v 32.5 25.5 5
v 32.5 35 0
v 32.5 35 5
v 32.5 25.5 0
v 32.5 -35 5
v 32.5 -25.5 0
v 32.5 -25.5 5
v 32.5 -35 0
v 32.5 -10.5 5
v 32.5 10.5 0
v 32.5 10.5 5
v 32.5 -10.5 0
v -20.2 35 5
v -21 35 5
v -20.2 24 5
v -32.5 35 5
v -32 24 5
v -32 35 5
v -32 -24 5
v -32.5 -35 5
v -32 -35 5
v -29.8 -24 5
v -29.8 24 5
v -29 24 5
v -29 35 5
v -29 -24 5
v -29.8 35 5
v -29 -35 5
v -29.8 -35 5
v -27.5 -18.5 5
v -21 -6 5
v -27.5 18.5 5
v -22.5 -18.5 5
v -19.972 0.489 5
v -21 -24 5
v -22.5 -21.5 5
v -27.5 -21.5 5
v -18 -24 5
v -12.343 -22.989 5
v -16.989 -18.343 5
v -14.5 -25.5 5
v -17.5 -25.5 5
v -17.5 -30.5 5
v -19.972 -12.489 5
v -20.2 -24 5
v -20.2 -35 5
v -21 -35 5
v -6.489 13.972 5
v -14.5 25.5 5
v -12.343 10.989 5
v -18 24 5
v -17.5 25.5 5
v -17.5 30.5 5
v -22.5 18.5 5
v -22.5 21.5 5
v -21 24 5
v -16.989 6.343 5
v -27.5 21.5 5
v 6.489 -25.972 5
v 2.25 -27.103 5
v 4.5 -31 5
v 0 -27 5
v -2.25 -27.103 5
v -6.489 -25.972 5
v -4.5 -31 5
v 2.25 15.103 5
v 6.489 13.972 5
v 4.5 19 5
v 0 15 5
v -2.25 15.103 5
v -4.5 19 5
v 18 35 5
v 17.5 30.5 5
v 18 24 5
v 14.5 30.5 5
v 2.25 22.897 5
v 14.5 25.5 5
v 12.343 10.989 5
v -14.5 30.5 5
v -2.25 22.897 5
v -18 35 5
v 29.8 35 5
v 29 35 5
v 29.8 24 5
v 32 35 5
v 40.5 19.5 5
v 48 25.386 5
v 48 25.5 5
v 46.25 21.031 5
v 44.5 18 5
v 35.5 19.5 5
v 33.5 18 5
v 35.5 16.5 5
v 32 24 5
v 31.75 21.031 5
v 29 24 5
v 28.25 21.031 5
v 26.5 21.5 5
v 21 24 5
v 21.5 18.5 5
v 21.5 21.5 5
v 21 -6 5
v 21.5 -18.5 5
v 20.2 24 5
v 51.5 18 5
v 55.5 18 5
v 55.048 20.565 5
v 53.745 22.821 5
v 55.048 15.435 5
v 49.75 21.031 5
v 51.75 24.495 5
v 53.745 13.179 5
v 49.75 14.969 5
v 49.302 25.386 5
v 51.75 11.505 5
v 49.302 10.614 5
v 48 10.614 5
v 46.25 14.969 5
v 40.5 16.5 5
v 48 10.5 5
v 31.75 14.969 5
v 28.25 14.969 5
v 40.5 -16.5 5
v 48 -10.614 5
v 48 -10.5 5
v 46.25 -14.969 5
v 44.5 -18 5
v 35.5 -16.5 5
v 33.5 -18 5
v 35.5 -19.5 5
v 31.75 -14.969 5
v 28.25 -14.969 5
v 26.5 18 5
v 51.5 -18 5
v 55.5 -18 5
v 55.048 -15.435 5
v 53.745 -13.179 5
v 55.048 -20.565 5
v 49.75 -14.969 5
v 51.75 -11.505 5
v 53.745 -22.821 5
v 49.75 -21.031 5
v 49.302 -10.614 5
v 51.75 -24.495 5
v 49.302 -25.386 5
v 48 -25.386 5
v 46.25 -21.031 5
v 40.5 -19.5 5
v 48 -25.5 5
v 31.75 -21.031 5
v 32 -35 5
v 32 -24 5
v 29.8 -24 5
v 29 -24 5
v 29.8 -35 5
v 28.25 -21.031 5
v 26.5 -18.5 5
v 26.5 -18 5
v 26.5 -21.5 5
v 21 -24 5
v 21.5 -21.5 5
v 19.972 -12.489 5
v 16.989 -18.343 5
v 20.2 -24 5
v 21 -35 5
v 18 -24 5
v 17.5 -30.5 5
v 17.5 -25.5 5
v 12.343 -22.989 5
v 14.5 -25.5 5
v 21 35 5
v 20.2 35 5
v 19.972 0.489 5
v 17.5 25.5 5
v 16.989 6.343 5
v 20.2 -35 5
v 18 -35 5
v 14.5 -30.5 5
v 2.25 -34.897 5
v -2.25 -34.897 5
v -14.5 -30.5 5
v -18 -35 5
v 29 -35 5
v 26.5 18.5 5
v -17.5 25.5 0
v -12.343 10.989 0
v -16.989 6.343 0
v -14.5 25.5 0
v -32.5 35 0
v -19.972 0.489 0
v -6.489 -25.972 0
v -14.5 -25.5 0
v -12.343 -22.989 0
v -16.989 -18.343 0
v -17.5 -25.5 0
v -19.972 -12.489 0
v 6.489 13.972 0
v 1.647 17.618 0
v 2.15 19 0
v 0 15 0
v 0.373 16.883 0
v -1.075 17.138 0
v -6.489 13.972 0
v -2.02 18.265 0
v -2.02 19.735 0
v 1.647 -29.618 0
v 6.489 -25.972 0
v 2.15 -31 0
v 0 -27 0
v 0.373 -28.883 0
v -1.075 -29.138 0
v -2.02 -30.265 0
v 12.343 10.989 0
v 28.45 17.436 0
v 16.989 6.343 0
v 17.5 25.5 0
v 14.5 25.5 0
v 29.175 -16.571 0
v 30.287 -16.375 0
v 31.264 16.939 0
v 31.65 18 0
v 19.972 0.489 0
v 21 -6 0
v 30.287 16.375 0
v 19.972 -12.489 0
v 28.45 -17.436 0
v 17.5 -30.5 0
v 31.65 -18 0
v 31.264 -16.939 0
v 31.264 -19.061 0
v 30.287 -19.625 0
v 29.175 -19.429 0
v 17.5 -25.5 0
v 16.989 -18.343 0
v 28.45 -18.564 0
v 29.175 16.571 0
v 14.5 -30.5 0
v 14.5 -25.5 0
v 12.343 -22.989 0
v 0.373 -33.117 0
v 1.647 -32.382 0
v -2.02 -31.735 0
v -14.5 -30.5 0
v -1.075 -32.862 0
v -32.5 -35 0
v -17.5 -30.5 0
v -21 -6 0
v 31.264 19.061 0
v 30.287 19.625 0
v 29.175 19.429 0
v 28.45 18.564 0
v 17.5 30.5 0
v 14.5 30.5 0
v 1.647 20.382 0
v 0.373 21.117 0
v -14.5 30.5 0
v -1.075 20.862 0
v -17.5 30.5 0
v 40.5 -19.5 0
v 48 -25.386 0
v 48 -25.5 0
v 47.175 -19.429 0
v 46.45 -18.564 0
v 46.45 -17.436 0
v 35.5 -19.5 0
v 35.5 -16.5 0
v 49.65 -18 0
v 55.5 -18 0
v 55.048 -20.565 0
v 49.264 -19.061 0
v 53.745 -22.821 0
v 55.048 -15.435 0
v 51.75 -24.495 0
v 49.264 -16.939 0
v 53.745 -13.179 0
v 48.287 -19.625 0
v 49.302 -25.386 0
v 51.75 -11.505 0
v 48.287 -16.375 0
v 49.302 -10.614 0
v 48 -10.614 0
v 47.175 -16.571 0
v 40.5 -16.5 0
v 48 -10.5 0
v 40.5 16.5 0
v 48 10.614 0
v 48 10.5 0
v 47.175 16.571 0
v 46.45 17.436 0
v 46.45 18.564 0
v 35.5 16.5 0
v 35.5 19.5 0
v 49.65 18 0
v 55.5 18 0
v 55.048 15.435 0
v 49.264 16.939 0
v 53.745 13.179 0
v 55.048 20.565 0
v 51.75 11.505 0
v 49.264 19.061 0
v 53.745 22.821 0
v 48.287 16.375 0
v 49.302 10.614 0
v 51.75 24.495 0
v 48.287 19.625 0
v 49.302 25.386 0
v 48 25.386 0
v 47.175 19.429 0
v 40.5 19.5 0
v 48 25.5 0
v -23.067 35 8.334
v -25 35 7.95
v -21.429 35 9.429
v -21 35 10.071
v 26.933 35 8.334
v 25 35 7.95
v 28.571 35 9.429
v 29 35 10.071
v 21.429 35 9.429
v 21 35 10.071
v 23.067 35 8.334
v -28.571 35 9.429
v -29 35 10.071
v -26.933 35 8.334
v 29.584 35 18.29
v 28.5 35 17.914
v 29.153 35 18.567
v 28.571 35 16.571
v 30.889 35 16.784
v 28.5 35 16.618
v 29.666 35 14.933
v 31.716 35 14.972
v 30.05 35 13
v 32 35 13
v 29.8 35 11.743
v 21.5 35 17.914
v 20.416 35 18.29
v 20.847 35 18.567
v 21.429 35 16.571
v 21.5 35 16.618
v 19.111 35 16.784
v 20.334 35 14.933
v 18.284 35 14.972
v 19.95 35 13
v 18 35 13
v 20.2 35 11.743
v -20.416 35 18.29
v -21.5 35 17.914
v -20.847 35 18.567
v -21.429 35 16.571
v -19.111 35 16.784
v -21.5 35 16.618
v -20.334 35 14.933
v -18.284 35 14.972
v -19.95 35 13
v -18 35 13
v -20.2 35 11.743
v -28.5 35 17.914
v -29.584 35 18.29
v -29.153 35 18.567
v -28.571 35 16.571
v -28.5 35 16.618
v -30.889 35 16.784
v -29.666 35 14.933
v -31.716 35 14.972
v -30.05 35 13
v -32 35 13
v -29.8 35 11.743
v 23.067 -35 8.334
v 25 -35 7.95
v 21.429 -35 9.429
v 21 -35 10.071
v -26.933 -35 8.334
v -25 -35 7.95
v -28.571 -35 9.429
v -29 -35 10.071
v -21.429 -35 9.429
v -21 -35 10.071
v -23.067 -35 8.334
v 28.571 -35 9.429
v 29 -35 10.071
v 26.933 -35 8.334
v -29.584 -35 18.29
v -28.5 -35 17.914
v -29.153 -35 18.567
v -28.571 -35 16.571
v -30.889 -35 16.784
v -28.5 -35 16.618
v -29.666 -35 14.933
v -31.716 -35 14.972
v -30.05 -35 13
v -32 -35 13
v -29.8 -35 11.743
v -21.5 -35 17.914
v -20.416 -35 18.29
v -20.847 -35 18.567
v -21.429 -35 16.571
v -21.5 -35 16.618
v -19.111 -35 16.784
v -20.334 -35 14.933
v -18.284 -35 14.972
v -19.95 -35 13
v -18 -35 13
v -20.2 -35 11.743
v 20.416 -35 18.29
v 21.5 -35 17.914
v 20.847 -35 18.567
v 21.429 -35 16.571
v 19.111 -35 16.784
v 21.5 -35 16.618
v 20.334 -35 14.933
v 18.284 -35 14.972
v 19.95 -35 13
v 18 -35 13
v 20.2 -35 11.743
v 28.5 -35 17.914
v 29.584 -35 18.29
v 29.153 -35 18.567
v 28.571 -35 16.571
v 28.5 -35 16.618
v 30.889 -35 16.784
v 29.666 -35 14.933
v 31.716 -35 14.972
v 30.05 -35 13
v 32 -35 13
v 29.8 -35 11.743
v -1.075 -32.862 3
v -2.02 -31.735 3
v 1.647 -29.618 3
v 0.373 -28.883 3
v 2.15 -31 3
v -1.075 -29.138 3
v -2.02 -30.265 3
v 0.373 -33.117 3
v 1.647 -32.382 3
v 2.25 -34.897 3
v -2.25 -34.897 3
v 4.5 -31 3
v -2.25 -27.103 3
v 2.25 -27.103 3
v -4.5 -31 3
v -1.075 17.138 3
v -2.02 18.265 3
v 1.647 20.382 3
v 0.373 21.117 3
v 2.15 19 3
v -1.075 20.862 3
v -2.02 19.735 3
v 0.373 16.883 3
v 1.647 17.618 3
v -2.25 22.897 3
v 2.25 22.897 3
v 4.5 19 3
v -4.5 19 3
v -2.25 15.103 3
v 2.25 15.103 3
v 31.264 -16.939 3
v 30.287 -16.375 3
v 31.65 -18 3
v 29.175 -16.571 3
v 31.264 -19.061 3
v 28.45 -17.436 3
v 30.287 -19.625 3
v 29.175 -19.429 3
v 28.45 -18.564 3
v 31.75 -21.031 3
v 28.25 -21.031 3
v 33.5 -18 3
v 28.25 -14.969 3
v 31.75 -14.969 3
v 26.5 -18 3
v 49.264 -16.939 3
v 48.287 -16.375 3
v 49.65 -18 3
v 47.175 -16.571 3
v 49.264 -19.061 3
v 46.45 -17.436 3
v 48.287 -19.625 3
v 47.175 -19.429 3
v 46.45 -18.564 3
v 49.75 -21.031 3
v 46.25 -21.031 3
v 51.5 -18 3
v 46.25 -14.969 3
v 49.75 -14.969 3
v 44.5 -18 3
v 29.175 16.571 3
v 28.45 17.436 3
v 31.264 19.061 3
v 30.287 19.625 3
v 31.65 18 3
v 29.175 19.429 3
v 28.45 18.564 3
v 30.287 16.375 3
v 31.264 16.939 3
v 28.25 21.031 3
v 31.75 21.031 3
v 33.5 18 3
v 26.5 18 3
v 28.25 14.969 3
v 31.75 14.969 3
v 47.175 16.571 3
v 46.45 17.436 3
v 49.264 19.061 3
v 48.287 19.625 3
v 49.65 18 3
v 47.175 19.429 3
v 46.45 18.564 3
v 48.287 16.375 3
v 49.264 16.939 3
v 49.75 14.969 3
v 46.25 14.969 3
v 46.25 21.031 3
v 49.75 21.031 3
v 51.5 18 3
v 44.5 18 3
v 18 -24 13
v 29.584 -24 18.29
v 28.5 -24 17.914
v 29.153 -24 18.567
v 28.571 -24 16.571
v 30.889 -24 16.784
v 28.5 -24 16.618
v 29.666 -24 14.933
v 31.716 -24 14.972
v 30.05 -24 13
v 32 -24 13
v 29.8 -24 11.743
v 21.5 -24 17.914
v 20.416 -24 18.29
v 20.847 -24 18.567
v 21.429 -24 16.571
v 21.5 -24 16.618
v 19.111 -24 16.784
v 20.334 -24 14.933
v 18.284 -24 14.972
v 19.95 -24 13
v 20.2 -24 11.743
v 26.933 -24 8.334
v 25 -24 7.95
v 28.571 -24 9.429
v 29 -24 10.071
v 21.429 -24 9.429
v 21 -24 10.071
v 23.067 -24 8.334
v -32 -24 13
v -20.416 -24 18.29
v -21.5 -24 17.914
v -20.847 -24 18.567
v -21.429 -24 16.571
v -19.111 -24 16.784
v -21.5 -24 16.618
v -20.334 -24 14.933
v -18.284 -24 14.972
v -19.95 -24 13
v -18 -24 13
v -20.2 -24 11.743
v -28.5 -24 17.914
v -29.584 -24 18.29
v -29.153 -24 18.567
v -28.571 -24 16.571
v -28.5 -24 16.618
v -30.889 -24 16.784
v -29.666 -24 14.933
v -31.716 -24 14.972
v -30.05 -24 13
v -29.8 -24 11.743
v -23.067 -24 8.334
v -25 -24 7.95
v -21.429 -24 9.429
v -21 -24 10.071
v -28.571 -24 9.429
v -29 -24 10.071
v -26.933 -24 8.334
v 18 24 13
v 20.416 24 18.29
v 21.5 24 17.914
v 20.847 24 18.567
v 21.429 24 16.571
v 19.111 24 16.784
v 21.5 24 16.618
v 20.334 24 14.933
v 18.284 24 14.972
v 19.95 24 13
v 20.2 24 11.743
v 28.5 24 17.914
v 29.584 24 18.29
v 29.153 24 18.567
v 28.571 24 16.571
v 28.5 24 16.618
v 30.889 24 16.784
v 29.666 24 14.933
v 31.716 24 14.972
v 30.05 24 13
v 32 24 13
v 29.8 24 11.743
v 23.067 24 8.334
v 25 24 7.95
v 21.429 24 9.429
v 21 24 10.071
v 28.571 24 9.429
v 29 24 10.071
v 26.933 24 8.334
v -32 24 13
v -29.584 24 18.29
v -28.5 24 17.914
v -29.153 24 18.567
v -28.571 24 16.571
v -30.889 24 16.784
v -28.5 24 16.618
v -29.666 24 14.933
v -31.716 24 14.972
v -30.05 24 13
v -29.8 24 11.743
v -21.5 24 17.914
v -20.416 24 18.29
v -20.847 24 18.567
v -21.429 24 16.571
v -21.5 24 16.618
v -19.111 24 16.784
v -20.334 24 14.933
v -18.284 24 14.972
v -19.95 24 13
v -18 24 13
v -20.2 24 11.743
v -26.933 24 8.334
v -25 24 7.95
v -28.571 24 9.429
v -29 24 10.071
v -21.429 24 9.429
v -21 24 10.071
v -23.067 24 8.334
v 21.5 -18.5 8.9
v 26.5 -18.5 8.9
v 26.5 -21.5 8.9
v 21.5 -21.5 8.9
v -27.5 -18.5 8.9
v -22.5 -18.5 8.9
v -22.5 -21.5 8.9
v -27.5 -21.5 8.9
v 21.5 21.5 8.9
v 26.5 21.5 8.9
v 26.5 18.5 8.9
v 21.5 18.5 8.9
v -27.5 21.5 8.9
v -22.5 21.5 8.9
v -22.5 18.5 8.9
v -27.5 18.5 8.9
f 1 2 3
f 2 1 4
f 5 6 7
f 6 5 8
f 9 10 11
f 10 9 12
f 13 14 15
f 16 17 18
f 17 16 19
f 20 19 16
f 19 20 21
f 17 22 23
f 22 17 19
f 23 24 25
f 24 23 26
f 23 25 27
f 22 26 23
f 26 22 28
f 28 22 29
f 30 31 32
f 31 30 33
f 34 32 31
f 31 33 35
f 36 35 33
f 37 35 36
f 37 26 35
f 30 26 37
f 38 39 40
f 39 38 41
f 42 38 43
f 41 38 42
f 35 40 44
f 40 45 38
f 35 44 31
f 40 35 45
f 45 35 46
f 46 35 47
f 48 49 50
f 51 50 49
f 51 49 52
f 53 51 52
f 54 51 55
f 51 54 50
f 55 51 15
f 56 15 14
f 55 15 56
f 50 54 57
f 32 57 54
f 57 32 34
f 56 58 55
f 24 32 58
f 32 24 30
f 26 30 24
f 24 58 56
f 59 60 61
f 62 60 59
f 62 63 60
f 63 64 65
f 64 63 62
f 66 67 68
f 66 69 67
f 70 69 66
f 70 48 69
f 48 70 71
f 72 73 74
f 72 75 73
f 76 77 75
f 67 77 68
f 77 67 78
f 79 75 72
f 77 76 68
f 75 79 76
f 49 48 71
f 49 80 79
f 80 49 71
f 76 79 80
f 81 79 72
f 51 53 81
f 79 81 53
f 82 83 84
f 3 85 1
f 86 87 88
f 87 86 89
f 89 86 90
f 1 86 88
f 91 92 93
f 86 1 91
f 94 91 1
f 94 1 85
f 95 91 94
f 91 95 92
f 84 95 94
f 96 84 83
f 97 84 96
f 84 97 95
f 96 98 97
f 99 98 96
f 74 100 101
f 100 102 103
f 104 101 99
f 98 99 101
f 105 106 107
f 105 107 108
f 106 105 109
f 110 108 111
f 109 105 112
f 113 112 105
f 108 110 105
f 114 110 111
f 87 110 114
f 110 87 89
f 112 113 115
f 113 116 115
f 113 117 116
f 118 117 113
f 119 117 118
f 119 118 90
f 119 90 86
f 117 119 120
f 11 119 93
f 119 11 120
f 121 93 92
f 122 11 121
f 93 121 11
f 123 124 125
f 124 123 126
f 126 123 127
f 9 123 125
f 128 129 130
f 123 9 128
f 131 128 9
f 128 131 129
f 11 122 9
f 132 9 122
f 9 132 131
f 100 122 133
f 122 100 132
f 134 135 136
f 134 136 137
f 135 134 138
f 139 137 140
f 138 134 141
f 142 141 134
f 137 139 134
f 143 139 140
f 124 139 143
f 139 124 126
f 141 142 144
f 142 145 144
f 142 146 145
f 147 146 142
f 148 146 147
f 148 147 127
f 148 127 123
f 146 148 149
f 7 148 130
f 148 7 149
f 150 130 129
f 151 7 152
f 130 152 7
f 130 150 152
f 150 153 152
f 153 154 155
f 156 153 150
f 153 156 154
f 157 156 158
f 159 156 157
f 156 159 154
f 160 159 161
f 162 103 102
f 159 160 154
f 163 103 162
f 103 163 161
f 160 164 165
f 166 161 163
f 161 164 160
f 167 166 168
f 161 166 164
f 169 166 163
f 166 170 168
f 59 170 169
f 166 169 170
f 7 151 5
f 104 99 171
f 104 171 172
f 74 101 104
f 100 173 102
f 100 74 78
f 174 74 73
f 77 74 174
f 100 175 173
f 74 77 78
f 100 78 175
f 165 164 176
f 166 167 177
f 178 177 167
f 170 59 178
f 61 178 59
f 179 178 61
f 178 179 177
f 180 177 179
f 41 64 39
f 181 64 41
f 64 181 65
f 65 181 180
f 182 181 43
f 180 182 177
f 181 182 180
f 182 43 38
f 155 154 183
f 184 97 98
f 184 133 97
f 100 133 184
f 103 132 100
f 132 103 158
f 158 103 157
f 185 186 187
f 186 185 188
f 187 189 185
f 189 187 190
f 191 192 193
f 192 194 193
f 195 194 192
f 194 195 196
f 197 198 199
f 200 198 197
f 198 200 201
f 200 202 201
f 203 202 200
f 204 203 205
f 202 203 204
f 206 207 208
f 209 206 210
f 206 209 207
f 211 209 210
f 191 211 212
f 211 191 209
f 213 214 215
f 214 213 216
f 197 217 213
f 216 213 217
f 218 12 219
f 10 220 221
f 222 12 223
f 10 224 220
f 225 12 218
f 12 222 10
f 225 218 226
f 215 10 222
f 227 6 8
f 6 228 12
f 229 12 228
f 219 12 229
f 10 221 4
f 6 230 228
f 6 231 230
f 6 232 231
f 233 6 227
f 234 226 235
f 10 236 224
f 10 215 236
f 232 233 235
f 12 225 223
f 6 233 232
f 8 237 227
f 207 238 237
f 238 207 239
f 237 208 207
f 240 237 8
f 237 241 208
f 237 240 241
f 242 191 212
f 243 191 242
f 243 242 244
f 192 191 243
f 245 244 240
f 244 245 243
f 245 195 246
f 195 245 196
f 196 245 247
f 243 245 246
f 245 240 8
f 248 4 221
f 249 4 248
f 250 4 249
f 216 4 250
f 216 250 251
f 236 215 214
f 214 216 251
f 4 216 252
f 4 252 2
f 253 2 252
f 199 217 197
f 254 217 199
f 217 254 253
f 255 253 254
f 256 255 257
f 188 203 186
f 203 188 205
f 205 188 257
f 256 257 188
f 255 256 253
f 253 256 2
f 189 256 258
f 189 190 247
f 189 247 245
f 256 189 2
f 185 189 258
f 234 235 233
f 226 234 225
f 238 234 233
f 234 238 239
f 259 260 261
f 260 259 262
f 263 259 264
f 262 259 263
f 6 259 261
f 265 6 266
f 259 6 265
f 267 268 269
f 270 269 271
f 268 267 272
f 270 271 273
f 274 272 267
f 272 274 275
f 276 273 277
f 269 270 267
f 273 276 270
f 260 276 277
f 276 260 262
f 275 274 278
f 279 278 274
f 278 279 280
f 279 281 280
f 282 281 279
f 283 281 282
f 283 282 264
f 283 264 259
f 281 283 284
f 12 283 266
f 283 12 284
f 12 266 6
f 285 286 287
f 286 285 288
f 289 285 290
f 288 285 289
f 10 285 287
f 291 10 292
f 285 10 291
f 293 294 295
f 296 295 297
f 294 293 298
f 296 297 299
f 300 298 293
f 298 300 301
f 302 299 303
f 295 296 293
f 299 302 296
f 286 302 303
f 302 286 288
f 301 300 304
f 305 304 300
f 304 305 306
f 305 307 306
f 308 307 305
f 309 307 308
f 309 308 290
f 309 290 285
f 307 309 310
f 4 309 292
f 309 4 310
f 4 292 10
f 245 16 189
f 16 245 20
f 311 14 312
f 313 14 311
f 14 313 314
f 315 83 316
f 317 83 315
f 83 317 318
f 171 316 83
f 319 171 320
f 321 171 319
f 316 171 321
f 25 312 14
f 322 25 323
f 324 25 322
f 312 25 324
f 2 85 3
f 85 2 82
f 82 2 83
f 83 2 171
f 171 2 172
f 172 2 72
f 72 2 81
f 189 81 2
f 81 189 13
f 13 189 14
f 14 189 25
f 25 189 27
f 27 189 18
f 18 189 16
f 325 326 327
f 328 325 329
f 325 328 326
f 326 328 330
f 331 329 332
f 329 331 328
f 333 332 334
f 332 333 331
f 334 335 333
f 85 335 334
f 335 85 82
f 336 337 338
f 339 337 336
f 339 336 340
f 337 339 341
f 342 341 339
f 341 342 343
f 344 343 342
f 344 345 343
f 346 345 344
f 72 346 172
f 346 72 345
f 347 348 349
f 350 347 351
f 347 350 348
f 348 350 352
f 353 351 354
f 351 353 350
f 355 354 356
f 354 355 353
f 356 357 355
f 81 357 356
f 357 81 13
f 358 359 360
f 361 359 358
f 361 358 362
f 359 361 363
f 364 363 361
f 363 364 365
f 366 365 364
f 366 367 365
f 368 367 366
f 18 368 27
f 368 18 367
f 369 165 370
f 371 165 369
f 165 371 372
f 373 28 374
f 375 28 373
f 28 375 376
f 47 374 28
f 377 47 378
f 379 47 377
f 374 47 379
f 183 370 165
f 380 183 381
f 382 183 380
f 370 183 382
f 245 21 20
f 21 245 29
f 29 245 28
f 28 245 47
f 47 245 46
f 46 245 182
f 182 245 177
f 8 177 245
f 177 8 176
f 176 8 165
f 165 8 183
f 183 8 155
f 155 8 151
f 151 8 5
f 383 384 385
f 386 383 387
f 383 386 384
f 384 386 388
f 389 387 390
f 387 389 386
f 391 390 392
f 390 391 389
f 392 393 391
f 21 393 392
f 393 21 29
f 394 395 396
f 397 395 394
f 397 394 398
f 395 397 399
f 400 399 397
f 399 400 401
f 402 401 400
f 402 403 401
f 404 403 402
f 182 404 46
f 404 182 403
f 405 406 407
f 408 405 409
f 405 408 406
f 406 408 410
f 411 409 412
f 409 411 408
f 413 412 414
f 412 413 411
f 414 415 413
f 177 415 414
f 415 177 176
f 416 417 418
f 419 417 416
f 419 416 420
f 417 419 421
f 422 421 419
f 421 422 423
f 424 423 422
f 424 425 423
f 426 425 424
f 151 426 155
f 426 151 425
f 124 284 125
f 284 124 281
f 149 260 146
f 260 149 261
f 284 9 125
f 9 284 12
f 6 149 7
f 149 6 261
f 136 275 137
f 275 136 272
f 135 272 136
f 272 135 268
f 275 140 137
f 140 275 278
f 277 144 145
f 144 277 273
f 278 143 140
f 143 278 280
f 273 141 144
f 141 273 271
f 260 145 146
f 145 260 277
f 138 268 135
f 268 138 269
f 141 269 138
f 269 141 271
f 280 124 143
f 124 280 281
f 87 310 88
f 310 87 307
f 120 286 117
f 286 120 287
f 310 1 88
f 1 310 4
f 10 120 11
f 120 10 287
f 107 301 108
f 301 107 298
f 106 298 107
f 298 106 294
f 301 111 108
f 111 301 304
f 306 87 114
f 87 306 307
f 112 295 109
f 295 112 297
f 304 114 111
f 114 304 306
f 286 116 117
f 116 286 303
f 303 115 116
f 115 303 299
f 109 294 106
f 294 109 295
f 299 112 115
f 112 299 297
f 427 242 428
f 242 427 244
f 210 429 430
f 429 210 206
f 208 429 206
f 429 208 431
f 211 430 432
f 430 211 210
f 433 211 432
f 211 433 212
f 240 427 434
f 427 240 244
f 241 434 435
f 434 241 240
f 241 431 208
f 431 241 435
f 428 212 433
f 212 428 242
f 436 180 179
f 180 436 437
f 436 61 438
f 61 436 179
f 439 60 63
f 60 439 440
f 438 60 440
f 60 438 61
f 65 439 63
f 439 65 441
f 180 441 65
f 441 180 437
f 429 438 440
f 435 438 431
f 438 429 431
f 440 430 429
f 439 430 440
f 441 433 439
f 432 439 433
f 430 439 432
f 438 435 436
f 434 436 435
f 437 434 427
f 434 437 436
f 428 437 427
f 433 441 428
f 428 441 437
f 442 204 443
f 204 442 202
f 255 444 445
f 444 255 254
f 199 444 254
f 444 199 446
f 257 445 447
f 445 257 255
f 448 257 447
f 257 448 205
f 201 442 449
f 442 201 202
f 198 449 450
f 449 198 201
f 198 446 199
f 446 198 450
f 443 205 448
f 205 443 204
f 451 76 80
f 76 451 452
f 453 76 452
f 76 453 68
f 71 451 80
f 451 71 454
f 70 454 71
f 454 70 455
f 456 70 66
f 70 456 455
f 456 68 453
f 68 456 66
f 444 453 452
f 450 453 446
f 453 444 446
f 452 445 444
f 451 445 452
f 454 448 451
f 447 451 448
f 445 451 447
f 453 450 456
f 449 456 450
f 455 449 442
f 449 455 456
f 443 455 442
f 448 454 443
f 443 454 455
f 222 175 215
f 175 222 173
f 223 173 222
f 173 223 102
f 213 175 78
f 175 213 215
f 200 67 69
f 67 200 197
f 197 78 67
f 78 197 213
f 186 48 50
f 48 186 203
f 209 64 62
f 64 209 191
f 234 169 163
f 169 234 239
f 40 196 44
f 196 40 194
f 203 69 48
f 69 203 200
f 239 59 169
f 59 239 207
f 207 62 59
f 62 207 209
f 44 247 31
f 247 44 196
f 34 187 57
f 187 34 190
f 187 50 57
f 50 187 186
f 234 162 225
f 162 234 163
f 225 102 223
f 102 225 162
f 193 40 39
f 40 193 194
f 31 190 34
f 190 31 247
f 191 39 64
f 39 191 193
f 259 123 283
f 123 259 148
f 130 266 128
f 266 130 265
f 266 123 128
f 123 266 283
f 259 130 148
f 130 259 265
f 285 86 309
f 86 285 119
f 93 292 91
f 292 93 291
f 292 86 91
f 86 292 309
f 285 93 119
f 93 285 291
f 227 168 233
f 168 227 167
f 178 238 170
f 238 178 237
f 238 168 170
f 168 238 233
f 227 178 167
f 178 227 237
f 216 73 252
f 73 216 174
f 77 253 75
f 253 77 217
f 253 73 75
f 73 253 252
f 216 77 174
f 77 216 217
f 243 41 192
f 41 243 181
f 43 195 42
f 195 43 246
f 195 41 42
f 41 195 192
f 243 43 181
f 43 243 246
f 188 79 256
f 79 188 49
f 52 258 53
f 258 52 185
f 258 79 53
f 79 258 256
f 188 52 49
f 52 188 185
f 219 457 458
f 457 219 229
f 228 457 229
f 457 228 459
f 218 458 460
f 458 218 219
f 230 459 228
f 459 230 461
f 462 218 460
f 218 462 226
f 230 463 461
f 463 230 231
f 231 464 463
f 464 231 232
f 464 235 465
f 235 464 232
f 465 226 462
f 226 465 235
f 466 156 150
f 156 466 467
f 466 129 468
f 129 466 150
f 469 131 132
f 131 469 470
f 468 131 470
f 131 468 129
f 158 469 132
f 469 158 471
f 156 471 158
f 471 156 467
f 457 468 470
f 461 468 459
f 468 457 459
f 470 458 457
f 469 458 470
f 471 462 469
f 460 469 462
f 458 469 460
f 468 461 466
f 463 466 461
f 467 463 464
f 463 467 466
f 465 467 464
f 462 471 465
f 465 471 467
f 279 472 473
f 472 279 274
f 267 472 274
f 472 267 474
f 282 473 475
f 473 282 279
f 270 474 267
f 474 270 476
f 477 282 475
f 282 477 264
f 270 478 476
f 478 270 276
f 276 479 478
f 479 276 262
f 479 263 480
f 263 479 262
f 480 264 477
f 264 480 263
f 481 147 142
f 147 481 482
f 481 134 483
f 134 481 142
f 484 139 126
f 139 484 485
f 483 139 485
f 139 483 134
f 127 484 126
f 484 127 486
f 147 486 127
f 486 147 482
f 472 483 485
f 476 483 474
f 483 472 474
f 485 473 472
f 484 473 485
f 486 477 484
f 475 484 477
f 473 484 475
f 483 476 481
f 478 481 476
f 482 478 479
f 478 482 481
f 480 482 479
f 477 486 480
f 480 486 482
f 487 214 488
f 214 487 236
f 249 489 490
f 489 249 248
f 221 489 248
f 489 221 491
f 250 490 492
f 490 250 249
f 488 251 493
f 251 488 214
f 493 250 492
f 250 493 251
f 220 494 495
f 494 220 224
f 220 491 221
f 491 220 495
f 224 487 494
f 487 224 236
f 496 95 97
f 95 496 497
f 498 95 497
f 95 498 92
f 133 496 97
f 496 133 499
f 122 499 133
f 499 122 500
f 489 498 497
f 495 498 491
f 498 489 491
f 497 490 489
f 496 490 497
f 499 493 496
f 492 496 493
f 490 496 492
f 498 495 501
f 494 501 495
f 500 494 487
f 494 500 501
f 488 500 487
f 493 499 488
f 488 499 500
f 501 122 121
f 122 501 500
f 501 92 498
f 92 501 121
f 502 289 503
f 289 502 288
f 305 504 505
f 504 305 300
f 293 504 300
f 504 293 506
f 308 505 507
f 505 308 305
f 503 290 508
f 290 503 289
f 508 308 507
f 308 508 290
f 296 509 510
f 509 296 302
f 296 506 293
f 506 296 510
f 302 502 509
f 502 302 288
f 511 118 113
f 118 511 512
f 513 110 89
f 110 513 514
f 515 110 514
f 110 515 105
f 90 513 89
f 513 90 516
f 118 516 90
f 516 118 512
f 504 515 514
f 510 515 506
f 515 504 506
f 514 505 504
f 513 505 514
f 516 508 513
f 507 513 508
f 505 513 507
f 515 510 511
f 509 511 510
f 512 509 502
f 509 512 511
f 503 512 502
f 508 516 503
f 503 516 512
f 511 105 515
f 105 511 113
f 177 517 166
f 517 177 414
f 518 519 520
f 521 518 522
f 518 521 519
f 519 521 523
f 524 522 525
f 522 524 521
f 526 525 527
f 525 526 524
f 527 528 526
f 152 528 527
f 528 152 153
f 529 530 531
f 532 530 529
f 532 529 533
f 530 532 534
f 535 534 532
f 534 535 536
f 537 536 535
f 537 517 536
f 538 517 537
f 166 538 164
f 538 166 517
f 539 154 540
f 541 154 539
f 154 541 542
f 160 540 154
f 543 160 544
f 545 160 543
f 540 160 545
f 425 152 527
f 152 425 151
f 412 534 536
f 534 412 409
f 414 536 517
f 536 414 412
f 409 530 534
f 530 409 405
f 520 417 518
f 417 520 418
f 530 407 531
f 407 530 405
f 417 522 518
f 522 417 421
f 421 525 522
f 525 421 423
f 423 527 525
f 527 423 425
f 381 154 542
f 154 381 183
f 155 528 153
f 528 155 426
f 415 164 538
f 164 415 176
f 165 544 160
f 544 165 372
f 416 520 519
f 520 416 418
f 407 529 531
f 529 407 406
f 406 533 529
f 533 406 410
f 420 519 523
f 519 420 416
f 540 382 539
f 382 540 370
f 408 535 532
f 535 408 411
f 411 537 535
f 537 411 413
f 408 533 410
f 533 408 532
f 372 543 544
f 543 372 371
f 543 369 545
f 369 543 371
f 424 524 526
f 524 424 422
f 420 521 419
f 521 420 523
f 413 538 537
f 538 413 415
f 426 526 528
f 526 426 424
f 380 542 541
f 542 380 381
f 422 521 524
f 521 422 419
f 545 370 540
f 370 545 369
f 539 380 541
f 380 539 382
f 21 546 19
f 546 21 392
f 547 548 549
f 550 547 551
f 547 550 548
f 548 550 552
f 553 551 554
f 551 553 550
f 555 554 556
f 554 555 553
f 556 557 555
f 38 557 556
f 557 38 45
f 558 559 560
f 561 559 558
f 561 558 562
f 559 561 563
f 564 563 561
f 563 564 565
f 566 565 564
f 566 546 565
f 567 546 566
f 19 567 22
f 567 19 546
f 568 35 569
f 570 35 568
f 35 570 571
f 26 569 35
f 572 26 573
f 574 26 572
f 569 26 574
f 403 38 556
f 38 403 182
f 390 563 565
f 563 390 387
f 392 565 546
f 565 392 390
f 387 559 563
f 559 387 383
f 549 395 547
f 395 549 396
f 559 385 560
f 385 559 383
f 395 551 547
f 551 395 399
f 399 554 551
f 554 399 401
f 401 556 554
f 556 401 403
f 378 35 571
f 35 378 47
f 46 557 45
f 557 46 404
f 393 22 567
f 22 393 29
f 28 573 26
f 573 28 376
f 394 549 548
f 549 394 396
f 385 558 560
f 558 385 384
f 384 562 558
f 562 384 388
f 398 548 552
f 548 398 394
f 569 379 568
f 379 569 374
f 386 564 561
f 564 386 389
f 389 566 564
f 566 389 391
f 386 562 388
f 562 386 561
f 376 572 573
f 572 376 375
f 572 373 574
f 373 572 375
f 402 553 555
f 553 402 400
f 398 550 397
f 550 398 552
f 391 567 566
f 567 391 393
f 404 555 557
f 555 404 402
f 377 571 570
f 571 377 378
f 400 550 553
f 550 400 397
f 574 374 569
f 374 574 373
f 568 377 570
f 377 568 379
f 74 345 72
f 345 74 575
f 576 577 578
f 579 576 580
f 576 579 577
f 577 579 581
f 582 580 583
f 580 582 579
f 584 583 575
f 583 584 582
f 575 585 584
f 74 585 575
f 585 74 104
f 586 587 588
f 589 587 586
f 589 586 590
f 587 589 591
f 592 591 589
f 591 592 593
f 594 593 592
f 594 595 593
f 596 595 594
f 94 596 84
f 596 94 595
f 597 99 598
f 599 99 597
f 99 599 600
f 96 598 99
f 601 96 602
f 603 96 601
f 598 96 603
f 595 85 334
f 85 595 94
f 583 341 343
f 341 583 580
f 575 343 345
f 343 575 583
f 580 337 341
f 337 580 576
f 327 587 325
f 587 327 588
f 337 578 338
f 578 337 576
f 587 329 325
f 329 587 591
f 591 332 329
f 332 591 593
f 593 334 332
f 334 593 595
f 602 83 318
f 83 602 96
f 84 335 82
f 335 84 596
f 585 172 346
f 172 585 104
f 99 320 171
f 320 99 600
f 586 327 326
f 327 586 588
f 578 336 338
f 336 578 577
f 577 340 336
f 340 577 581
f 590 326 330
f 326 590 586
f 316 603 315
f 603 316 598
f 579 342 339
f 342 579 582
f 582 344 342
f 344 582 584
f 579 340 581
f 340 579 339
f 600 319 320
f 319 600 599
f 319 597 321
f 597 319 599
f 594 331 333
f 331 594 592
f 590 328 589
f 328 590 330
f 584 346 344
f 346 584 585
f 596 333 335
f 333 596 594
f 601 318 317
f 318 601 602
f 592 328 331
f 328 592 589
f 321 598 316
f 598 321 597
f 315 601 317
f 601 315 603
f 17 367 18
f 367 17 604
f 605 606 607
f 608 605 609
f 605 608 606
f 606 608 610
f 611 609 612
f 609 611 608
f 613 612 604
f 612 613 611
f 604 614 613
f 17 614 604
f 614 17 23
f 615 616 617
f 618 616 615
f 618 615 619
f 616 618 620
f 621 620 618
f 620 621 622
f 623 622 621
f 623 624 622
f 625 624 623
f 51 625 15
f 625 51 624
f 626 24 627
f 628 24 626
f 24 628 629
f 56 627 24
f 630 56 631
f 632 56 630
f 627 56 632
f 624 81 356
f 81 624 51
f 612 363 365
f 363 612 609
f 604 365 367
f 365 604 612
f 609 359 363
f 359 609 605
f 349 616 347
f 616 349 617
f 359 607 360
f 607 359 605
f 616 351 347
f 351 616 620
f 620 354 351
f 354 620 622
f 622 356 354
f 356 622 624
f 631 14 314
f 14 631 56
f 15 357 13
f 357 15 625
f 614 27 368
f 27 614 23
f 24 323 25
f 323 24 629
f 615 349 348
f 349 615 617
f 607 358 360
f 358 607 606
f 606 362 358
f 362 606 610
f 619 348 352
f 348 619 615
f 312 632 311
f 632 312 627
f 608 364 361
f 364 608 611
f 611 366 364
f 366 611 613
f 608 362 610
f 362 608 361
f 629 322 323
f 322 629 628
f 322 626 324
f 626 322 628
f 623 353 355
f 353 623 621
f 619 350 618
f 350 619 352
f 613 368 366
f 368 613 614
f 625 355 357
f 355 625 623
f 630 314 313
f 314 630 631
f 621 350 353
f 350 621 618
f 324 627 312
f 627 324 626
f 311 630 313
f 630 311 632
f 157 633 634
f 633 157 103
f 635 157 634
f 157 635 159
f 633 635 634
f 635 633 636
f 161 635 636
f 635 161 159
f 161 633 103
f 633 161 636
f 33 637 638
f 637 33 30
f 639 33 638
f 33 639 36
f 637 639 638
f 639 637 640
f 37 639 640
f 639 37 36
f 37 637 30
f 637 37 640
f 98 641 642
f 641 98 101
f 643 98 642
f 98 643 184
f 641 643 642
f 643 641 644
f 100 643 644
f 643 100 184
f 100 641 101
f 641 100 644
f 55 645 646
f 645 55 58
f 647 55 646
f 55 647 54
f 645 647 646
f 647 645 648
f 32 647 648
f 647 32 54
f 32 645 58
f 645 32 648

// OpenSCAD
// file: bushing.scad
// PRUSA Mendel  
// Bushings
// GNU GPL v2
// Josef Průša
// josefprusa@me.com
// prusadjs.cz
// http://www.reprap.org/wiki/Prusa_Mendel
// http://github.com/prusajr/PrusaMendel

include <configuration.scad>

/**
 * @name Bushing
 * @category Printed
 * @link bushing
 */ 

rodsize = bushing_rodsize+0.1;
outerDiameter = bushing_outerDiameter;
lenght = bushing_lenght;
type = bushing_type;


module bushing(stiff, lenght=11){
	difference(){
		union(){
			translate(v=[-7,-8,0])cube(size = [14,8,lenght]);
			cylinder(h = lenght, r=7);
		}
	//cutout inside
	//Opening
	rotate(a=[0,0,45]) translate(v=[1,1,-1]) cube(size = [16,16,lenght+2]);
	//Cutouts to make it more bendy
	if(stiff){
		translate(v=[-4.8,-6,-1]) cube(size = [0.8,6,lenght+2]);
		translate(v=[4,-6,-1]) cube(size = [0.8,6,lenght+2]);
	}else{
		translate(v=[-4.8,-8,-1]) cube(size = [0.8,8,lenght+2]);
		translate(v=[4,-8,-1]) cube(size = [0.8,8,lenght+2]);
	}
	translate(v=[0,5,(lenght+2)/2]) cube(size = [7,8,lenght+2], center=true);
	translate(v=[0,0,-1]) cylinder(h = lenght+2, r=(rodsize+2)/2);
	}
}
module do_bushing(base_depth){
translate([0,0,8+base_depth]) rotate([90,0,0])
difference(){
	union(){
		bushing(false, 11);
		translate(v=[-7,-8-base_depth,0])cube(size = [14,base_depth,15]);
		translate(v=[-7,-8-base_depth,13])cube(size = [14,base_depth+3,2]);
	}
	translate([0,-6-base_depth,5.5]) rotate([90,0,0]) cylinder(h=base_depth+2,r=2.7/2,center=true, $fn=12);
}
}

do_bushing(4);
// file: configuration.scad
// PRUSA Mendel  
// Configuration file
// GNU GPL v2
// Josef Průša
// josefprusa@me.com
// prusadjs.cz
// http://www.reprap.org/wiki/Prusa_Mendel
// http://github.com/prusajr/PrusaMendel

// PLEASE SELECT ONE OF THE CONFIGURATIONS BELOW
// BY UN-COMMENTING IT

variant=0; //0 for metric
//variant=1; //1 for SAE
if(variant==0){
echo("variant: metric");
}else if(variant==1){
echo("variant: sae");
} else{
echo("WARNING: INVALID CONFIGURATION");
}


vars=[
//[m8_dia, m8_nut, m4_dia, m4_nut, m3_dia, m3_nut, bush_dia, mot_shaft, bush_rod, bush_outerdia, bush_length]
[8.3,16.4,4.3,9,3.3,7,11,5.3,8,16,11],//metric
[9,15.7,5.5,10.6,5.5,10.6,11.5,5.3,7.9375,16,11]//SAE
];

//BUSHING TYPE Can generate three versions
// 1 - regular old ones
// 2 - helical ones
// 3 - holders for brass or any other bought bushings
bushing_type = 2;

//Round corner diameter
round_corner_diameter = 8;

//X end parameters
axis_diameter_real = 4;
axis_diameter_larger = 4.2 ;
pressure_pad_height = 0.7;

//Thin wall size
layer_height = 0.4;
perimeter_width_over_thicknes = 1.6;
infill_widht_over_thickness = 1.55;
thin_wall = 2*(perimeter_width_over_thicknes*layer_height+infill_widht_over_thickness*layer_height);
if(thin_wall<2){
	echo("Check thin wall size, its below 2mm!");
}
echo(thin_wall);

//DO NOT TOUCH THIS SECTION!
m8_diameter = vars[variant][0];
m8_nut_diameter = vars[variant][1];
m4_diameter = vars[variant][2];
m4_nut_diameter = vars[variant][3];
m3_diameter = vars[variant][4];
m3_nut_diameter = vars[variant][5];
bushing_diameter = vars[variant][6];
motor_shaft=vars[variant][7];
bushing_rodsize = vars[variant][8];
bushing_outerDiameter = vars[variant][9];
bushing_lenght = vars[variant][10];


// MINI-HUXLEY VERSION (TODO, just place holder)
// include <configuration-huxley.scad>

// MEGA VERSION (TODO, just place holder)
// include <configuration-mega.scad>


// Some basic functions, probably should be somewhere else
module roundcorner(diameter){
	difference(){
		cube(size = [diameter,diameter,99], center = false);
		translate(v = [diameter, diameter, 0]) cylinder(h = 100, r=diameter, center=true);
	}
}
module polyhole(h, d) {
    n = max(round(2 * d),3);
    rotate([0,0,180])
        cylinder(h = h, r = (d / 2) / cos (180 / n), $fn = n);
}
// main file
// PRUSA Mendel  
// X-carriage
// Used for sliding on X axis
// GNU GPL v2
// Josef Průša
// josefprusa@me.com
// prusadjs.cz
// http://www.reprap.org/wiki/Prusa_Mendel
// http://github.com/prusajr/PrusaMendel

include <configuration.scad>

/**
 * @name X carriage
 * @category Printed
 * @using 2 m4nut
 * @using 2 m4x25
 */

snap_in_mount = false;
bushings = true;
use <bushing.scad>

module xcarriage(){
	translate(v = [0,0,2.5]) 
		union(){
			difference(){
				union(){
					//Base block
						cube(size = [65,70,5], center = true);
					//Nut holder base - extruder

					//Nut holder base - belt clamps
						translate(v = [23-(7.5/2)+5, -18, 0]) cube(size = [45-7.5+10,15,5], center = true);
						translate(v = [(33+45/2-7.5), -18, 0]) cylinder(h = 5, r=7.5, $fn=18, center=true);
					//Nut holder base - belt clamps
						translate(v = [23-(7.5/2)+5, 18, 0]) cube(size = [45-7.5+10,15,5], center = true);
						translate(v = [(33+45/2-7.5), 18, 0]) cylinder(h = 5, r=7.5, $fn=18, center=true);
				}
				// holes for connecting extruder
				// SNAP IN MOUNT
				if(snap_in_mount){
					// Hotend hole
					translate(v = [0, -6, 0]) cylinder(h = 20, r=6, $fn=20, center=true);
					translate(v = [0, -6, 3]) cylinder(h = 2, r=8, $fn=20, center=true);
					translate(v = [0, 0, 3]) cube(size = [16,12,2], center = true);
					//translate(v = [0, -6, -5]) %cylinder(h = 2, r=8, $fn=20, center=true);

					translate(v = [0, 0, 0]) cube(size = [12,12,15], center = true);
					translate(v = [0, 8, 0]) cube(size = [16,16,15], center = true);
					translate(v = [0, 16, 0]) cylinder(h = 20, r=8, $fn=20, center=true);

					//cutouts for clips
					translate(v = [0, -4.5, 0]) translate(v = [-13, 6, 0]) cube(size = [4,45,15], center = true);
					translate(v = [0, -4.5, 0]) translate(v = [13, 6, 0]) cube(size = [4,45,15], center = true);
		
					//bigger oepening
					translate(v = [0, -4.5+12.5, 0]) translate(v = [-15.5, 6, 0]) cube(size = [9,20,15], center = true);
					translate(v = [0, -4.5+12.5, 0]) translate(v = [15.5, 6, 0]) cube(size = [9,20,15], center = true);
		
		
					translate(v = [0, -4.5+9.5, 0]) translate(v = [-15.5, 6, 6.5]) rotate(a=[-20,0,0])  cube(size = [9,20,15], center = true);
					translate(v = [0, -4.5+9.5, 0]) translate(v = [15.5, 6, 6.5]) rotate(a=[-20,0,0]) cube(size = [9,20,15], center = true);
		
					translate(v = [0, -4.5-12.5, 0]) translate(v = [-18, 6, 3.5]) cube(size = [4,20,3], center = true);
					translate(v = [0, -4.5-12.5, 0]) translate(v = [18, 6, 3.5]) cube(size = [4,20,3], center = true);
				
					//SNAP IN MOUNT END
				}else{
					//NORMAL MOUNT
		
					translate(v = [0, -31, 2]) cylinder(h = 10, r=m4_diameter/2, $fn=9, center=true);		
					translate(v = [0, -31, 5]) cylinder(h = 9, r=m4_nut_diameter/2, $fn=6, center=true);		
					translate(v = [0, 19, ]) cylinder(h = 20, r=m4_diameter/2, $fn=9, center=true);
					translate(v = [0, 19, 5]) cylinder(h = 9, r=4.5, $fn=6, center=true);	
		
					// Hotend hole
					translate(v = [0, -6, 0]) cylinder(h = 20, r=21, $fn=20, center=true);
		
					//NORMAL MOUNT END
				}
				//ZIPTIE holes for connecting belt
				translate(v = [38, -18, 2]) cube(size = [5,3,30], center = true);
				translate(v = [38, 18, 2]) cube(size = [5,3,30], center = true);

				//ZIPTIE holes for tightening bushings
				translate(v = [16, -28, 2]) cube(size = [3,5,30], center = true);
				translate(v = [16, 28, 2]) cube(size = [3,5,30], center = true);
				translate(v = [-16, -28, 2]) cube(size = [3,5,30], center = true);
				translate(v = [-16, 28, 2]) cube(size = [3,5,30], center = true);

				//belt clamp holes
					translate(v = [30, -18, 2]) cylinder(h = 10, r=m3_diameter/2, $fn=9, center=true);
				translate(v = [30, -18, 5]) cylinder(h = 9, r=m3_nut_diameter/2, $fn=6, center=true);
					translate(v = [48, -18, 2]) cylinder(h = 10, r=m3_diameter/2, $fn=9, center=true);		
				translate(v = [48, -18, 5]) cylinder(h = 9, r=m3_nut_diameter/2, $fn=6, center=true);

				translate(v = [30, 18, 2]) cylinder(h = 10, r=m3_diameter/2, $fn=9, center=true);
				translate(v = [30, 18, 5]) cylinder(h = 9, r=m3_nut_diameter/2, $fn=6, center=true);
				translate(v = [48, 18, 2]) cylinder(h = 10, r=m3_diameter/2, $fn=9, center=true);
				translate(v = [48, 18, 5]) cylinder(h = 9, r=m3_nut_diameter/2, $fn=6, center=true);
				//
			}

	}
	if(bushings){
	translate(v = [0,-35,2.5])rotate(a=[-90,0,0])union(){
		translate(v = [25,-10.5,0]) rotate(a=[0,0,180]) bushing();
		translate(v = [-25,-10.5,0]) rotate(a=[0,0,180]) bushing();
		translate(v = [25,-10.5,59]) rotate(a=[0,0,180]) bushing();
		translate(v = [-25,-10.5,59]) rotate(a=[0,0,180]) bushing();
	}
	}
	translate(v = [0,-35,2.5])rotate(a=[-90,0,0])union(){
	translate(v = [24,-4.4,15]) rotate(a=[0,0,180]) cube(size = [5,4,3], center = true);
	translate(v = [-25,-4.4,15]) rotate(a=[0,0,180]) cube(size = [5,4,3], center = true);
	translate(v = [24,-4.4,55]) rotate(a=[0,0,180]) cube(size = [5,4,3], center = true);
	translate(v = [-25,-4.4,55]) rotate(a=[0,0,180]) cube(size = [5,4,3], center = true);
	}
}

xcarriage();
